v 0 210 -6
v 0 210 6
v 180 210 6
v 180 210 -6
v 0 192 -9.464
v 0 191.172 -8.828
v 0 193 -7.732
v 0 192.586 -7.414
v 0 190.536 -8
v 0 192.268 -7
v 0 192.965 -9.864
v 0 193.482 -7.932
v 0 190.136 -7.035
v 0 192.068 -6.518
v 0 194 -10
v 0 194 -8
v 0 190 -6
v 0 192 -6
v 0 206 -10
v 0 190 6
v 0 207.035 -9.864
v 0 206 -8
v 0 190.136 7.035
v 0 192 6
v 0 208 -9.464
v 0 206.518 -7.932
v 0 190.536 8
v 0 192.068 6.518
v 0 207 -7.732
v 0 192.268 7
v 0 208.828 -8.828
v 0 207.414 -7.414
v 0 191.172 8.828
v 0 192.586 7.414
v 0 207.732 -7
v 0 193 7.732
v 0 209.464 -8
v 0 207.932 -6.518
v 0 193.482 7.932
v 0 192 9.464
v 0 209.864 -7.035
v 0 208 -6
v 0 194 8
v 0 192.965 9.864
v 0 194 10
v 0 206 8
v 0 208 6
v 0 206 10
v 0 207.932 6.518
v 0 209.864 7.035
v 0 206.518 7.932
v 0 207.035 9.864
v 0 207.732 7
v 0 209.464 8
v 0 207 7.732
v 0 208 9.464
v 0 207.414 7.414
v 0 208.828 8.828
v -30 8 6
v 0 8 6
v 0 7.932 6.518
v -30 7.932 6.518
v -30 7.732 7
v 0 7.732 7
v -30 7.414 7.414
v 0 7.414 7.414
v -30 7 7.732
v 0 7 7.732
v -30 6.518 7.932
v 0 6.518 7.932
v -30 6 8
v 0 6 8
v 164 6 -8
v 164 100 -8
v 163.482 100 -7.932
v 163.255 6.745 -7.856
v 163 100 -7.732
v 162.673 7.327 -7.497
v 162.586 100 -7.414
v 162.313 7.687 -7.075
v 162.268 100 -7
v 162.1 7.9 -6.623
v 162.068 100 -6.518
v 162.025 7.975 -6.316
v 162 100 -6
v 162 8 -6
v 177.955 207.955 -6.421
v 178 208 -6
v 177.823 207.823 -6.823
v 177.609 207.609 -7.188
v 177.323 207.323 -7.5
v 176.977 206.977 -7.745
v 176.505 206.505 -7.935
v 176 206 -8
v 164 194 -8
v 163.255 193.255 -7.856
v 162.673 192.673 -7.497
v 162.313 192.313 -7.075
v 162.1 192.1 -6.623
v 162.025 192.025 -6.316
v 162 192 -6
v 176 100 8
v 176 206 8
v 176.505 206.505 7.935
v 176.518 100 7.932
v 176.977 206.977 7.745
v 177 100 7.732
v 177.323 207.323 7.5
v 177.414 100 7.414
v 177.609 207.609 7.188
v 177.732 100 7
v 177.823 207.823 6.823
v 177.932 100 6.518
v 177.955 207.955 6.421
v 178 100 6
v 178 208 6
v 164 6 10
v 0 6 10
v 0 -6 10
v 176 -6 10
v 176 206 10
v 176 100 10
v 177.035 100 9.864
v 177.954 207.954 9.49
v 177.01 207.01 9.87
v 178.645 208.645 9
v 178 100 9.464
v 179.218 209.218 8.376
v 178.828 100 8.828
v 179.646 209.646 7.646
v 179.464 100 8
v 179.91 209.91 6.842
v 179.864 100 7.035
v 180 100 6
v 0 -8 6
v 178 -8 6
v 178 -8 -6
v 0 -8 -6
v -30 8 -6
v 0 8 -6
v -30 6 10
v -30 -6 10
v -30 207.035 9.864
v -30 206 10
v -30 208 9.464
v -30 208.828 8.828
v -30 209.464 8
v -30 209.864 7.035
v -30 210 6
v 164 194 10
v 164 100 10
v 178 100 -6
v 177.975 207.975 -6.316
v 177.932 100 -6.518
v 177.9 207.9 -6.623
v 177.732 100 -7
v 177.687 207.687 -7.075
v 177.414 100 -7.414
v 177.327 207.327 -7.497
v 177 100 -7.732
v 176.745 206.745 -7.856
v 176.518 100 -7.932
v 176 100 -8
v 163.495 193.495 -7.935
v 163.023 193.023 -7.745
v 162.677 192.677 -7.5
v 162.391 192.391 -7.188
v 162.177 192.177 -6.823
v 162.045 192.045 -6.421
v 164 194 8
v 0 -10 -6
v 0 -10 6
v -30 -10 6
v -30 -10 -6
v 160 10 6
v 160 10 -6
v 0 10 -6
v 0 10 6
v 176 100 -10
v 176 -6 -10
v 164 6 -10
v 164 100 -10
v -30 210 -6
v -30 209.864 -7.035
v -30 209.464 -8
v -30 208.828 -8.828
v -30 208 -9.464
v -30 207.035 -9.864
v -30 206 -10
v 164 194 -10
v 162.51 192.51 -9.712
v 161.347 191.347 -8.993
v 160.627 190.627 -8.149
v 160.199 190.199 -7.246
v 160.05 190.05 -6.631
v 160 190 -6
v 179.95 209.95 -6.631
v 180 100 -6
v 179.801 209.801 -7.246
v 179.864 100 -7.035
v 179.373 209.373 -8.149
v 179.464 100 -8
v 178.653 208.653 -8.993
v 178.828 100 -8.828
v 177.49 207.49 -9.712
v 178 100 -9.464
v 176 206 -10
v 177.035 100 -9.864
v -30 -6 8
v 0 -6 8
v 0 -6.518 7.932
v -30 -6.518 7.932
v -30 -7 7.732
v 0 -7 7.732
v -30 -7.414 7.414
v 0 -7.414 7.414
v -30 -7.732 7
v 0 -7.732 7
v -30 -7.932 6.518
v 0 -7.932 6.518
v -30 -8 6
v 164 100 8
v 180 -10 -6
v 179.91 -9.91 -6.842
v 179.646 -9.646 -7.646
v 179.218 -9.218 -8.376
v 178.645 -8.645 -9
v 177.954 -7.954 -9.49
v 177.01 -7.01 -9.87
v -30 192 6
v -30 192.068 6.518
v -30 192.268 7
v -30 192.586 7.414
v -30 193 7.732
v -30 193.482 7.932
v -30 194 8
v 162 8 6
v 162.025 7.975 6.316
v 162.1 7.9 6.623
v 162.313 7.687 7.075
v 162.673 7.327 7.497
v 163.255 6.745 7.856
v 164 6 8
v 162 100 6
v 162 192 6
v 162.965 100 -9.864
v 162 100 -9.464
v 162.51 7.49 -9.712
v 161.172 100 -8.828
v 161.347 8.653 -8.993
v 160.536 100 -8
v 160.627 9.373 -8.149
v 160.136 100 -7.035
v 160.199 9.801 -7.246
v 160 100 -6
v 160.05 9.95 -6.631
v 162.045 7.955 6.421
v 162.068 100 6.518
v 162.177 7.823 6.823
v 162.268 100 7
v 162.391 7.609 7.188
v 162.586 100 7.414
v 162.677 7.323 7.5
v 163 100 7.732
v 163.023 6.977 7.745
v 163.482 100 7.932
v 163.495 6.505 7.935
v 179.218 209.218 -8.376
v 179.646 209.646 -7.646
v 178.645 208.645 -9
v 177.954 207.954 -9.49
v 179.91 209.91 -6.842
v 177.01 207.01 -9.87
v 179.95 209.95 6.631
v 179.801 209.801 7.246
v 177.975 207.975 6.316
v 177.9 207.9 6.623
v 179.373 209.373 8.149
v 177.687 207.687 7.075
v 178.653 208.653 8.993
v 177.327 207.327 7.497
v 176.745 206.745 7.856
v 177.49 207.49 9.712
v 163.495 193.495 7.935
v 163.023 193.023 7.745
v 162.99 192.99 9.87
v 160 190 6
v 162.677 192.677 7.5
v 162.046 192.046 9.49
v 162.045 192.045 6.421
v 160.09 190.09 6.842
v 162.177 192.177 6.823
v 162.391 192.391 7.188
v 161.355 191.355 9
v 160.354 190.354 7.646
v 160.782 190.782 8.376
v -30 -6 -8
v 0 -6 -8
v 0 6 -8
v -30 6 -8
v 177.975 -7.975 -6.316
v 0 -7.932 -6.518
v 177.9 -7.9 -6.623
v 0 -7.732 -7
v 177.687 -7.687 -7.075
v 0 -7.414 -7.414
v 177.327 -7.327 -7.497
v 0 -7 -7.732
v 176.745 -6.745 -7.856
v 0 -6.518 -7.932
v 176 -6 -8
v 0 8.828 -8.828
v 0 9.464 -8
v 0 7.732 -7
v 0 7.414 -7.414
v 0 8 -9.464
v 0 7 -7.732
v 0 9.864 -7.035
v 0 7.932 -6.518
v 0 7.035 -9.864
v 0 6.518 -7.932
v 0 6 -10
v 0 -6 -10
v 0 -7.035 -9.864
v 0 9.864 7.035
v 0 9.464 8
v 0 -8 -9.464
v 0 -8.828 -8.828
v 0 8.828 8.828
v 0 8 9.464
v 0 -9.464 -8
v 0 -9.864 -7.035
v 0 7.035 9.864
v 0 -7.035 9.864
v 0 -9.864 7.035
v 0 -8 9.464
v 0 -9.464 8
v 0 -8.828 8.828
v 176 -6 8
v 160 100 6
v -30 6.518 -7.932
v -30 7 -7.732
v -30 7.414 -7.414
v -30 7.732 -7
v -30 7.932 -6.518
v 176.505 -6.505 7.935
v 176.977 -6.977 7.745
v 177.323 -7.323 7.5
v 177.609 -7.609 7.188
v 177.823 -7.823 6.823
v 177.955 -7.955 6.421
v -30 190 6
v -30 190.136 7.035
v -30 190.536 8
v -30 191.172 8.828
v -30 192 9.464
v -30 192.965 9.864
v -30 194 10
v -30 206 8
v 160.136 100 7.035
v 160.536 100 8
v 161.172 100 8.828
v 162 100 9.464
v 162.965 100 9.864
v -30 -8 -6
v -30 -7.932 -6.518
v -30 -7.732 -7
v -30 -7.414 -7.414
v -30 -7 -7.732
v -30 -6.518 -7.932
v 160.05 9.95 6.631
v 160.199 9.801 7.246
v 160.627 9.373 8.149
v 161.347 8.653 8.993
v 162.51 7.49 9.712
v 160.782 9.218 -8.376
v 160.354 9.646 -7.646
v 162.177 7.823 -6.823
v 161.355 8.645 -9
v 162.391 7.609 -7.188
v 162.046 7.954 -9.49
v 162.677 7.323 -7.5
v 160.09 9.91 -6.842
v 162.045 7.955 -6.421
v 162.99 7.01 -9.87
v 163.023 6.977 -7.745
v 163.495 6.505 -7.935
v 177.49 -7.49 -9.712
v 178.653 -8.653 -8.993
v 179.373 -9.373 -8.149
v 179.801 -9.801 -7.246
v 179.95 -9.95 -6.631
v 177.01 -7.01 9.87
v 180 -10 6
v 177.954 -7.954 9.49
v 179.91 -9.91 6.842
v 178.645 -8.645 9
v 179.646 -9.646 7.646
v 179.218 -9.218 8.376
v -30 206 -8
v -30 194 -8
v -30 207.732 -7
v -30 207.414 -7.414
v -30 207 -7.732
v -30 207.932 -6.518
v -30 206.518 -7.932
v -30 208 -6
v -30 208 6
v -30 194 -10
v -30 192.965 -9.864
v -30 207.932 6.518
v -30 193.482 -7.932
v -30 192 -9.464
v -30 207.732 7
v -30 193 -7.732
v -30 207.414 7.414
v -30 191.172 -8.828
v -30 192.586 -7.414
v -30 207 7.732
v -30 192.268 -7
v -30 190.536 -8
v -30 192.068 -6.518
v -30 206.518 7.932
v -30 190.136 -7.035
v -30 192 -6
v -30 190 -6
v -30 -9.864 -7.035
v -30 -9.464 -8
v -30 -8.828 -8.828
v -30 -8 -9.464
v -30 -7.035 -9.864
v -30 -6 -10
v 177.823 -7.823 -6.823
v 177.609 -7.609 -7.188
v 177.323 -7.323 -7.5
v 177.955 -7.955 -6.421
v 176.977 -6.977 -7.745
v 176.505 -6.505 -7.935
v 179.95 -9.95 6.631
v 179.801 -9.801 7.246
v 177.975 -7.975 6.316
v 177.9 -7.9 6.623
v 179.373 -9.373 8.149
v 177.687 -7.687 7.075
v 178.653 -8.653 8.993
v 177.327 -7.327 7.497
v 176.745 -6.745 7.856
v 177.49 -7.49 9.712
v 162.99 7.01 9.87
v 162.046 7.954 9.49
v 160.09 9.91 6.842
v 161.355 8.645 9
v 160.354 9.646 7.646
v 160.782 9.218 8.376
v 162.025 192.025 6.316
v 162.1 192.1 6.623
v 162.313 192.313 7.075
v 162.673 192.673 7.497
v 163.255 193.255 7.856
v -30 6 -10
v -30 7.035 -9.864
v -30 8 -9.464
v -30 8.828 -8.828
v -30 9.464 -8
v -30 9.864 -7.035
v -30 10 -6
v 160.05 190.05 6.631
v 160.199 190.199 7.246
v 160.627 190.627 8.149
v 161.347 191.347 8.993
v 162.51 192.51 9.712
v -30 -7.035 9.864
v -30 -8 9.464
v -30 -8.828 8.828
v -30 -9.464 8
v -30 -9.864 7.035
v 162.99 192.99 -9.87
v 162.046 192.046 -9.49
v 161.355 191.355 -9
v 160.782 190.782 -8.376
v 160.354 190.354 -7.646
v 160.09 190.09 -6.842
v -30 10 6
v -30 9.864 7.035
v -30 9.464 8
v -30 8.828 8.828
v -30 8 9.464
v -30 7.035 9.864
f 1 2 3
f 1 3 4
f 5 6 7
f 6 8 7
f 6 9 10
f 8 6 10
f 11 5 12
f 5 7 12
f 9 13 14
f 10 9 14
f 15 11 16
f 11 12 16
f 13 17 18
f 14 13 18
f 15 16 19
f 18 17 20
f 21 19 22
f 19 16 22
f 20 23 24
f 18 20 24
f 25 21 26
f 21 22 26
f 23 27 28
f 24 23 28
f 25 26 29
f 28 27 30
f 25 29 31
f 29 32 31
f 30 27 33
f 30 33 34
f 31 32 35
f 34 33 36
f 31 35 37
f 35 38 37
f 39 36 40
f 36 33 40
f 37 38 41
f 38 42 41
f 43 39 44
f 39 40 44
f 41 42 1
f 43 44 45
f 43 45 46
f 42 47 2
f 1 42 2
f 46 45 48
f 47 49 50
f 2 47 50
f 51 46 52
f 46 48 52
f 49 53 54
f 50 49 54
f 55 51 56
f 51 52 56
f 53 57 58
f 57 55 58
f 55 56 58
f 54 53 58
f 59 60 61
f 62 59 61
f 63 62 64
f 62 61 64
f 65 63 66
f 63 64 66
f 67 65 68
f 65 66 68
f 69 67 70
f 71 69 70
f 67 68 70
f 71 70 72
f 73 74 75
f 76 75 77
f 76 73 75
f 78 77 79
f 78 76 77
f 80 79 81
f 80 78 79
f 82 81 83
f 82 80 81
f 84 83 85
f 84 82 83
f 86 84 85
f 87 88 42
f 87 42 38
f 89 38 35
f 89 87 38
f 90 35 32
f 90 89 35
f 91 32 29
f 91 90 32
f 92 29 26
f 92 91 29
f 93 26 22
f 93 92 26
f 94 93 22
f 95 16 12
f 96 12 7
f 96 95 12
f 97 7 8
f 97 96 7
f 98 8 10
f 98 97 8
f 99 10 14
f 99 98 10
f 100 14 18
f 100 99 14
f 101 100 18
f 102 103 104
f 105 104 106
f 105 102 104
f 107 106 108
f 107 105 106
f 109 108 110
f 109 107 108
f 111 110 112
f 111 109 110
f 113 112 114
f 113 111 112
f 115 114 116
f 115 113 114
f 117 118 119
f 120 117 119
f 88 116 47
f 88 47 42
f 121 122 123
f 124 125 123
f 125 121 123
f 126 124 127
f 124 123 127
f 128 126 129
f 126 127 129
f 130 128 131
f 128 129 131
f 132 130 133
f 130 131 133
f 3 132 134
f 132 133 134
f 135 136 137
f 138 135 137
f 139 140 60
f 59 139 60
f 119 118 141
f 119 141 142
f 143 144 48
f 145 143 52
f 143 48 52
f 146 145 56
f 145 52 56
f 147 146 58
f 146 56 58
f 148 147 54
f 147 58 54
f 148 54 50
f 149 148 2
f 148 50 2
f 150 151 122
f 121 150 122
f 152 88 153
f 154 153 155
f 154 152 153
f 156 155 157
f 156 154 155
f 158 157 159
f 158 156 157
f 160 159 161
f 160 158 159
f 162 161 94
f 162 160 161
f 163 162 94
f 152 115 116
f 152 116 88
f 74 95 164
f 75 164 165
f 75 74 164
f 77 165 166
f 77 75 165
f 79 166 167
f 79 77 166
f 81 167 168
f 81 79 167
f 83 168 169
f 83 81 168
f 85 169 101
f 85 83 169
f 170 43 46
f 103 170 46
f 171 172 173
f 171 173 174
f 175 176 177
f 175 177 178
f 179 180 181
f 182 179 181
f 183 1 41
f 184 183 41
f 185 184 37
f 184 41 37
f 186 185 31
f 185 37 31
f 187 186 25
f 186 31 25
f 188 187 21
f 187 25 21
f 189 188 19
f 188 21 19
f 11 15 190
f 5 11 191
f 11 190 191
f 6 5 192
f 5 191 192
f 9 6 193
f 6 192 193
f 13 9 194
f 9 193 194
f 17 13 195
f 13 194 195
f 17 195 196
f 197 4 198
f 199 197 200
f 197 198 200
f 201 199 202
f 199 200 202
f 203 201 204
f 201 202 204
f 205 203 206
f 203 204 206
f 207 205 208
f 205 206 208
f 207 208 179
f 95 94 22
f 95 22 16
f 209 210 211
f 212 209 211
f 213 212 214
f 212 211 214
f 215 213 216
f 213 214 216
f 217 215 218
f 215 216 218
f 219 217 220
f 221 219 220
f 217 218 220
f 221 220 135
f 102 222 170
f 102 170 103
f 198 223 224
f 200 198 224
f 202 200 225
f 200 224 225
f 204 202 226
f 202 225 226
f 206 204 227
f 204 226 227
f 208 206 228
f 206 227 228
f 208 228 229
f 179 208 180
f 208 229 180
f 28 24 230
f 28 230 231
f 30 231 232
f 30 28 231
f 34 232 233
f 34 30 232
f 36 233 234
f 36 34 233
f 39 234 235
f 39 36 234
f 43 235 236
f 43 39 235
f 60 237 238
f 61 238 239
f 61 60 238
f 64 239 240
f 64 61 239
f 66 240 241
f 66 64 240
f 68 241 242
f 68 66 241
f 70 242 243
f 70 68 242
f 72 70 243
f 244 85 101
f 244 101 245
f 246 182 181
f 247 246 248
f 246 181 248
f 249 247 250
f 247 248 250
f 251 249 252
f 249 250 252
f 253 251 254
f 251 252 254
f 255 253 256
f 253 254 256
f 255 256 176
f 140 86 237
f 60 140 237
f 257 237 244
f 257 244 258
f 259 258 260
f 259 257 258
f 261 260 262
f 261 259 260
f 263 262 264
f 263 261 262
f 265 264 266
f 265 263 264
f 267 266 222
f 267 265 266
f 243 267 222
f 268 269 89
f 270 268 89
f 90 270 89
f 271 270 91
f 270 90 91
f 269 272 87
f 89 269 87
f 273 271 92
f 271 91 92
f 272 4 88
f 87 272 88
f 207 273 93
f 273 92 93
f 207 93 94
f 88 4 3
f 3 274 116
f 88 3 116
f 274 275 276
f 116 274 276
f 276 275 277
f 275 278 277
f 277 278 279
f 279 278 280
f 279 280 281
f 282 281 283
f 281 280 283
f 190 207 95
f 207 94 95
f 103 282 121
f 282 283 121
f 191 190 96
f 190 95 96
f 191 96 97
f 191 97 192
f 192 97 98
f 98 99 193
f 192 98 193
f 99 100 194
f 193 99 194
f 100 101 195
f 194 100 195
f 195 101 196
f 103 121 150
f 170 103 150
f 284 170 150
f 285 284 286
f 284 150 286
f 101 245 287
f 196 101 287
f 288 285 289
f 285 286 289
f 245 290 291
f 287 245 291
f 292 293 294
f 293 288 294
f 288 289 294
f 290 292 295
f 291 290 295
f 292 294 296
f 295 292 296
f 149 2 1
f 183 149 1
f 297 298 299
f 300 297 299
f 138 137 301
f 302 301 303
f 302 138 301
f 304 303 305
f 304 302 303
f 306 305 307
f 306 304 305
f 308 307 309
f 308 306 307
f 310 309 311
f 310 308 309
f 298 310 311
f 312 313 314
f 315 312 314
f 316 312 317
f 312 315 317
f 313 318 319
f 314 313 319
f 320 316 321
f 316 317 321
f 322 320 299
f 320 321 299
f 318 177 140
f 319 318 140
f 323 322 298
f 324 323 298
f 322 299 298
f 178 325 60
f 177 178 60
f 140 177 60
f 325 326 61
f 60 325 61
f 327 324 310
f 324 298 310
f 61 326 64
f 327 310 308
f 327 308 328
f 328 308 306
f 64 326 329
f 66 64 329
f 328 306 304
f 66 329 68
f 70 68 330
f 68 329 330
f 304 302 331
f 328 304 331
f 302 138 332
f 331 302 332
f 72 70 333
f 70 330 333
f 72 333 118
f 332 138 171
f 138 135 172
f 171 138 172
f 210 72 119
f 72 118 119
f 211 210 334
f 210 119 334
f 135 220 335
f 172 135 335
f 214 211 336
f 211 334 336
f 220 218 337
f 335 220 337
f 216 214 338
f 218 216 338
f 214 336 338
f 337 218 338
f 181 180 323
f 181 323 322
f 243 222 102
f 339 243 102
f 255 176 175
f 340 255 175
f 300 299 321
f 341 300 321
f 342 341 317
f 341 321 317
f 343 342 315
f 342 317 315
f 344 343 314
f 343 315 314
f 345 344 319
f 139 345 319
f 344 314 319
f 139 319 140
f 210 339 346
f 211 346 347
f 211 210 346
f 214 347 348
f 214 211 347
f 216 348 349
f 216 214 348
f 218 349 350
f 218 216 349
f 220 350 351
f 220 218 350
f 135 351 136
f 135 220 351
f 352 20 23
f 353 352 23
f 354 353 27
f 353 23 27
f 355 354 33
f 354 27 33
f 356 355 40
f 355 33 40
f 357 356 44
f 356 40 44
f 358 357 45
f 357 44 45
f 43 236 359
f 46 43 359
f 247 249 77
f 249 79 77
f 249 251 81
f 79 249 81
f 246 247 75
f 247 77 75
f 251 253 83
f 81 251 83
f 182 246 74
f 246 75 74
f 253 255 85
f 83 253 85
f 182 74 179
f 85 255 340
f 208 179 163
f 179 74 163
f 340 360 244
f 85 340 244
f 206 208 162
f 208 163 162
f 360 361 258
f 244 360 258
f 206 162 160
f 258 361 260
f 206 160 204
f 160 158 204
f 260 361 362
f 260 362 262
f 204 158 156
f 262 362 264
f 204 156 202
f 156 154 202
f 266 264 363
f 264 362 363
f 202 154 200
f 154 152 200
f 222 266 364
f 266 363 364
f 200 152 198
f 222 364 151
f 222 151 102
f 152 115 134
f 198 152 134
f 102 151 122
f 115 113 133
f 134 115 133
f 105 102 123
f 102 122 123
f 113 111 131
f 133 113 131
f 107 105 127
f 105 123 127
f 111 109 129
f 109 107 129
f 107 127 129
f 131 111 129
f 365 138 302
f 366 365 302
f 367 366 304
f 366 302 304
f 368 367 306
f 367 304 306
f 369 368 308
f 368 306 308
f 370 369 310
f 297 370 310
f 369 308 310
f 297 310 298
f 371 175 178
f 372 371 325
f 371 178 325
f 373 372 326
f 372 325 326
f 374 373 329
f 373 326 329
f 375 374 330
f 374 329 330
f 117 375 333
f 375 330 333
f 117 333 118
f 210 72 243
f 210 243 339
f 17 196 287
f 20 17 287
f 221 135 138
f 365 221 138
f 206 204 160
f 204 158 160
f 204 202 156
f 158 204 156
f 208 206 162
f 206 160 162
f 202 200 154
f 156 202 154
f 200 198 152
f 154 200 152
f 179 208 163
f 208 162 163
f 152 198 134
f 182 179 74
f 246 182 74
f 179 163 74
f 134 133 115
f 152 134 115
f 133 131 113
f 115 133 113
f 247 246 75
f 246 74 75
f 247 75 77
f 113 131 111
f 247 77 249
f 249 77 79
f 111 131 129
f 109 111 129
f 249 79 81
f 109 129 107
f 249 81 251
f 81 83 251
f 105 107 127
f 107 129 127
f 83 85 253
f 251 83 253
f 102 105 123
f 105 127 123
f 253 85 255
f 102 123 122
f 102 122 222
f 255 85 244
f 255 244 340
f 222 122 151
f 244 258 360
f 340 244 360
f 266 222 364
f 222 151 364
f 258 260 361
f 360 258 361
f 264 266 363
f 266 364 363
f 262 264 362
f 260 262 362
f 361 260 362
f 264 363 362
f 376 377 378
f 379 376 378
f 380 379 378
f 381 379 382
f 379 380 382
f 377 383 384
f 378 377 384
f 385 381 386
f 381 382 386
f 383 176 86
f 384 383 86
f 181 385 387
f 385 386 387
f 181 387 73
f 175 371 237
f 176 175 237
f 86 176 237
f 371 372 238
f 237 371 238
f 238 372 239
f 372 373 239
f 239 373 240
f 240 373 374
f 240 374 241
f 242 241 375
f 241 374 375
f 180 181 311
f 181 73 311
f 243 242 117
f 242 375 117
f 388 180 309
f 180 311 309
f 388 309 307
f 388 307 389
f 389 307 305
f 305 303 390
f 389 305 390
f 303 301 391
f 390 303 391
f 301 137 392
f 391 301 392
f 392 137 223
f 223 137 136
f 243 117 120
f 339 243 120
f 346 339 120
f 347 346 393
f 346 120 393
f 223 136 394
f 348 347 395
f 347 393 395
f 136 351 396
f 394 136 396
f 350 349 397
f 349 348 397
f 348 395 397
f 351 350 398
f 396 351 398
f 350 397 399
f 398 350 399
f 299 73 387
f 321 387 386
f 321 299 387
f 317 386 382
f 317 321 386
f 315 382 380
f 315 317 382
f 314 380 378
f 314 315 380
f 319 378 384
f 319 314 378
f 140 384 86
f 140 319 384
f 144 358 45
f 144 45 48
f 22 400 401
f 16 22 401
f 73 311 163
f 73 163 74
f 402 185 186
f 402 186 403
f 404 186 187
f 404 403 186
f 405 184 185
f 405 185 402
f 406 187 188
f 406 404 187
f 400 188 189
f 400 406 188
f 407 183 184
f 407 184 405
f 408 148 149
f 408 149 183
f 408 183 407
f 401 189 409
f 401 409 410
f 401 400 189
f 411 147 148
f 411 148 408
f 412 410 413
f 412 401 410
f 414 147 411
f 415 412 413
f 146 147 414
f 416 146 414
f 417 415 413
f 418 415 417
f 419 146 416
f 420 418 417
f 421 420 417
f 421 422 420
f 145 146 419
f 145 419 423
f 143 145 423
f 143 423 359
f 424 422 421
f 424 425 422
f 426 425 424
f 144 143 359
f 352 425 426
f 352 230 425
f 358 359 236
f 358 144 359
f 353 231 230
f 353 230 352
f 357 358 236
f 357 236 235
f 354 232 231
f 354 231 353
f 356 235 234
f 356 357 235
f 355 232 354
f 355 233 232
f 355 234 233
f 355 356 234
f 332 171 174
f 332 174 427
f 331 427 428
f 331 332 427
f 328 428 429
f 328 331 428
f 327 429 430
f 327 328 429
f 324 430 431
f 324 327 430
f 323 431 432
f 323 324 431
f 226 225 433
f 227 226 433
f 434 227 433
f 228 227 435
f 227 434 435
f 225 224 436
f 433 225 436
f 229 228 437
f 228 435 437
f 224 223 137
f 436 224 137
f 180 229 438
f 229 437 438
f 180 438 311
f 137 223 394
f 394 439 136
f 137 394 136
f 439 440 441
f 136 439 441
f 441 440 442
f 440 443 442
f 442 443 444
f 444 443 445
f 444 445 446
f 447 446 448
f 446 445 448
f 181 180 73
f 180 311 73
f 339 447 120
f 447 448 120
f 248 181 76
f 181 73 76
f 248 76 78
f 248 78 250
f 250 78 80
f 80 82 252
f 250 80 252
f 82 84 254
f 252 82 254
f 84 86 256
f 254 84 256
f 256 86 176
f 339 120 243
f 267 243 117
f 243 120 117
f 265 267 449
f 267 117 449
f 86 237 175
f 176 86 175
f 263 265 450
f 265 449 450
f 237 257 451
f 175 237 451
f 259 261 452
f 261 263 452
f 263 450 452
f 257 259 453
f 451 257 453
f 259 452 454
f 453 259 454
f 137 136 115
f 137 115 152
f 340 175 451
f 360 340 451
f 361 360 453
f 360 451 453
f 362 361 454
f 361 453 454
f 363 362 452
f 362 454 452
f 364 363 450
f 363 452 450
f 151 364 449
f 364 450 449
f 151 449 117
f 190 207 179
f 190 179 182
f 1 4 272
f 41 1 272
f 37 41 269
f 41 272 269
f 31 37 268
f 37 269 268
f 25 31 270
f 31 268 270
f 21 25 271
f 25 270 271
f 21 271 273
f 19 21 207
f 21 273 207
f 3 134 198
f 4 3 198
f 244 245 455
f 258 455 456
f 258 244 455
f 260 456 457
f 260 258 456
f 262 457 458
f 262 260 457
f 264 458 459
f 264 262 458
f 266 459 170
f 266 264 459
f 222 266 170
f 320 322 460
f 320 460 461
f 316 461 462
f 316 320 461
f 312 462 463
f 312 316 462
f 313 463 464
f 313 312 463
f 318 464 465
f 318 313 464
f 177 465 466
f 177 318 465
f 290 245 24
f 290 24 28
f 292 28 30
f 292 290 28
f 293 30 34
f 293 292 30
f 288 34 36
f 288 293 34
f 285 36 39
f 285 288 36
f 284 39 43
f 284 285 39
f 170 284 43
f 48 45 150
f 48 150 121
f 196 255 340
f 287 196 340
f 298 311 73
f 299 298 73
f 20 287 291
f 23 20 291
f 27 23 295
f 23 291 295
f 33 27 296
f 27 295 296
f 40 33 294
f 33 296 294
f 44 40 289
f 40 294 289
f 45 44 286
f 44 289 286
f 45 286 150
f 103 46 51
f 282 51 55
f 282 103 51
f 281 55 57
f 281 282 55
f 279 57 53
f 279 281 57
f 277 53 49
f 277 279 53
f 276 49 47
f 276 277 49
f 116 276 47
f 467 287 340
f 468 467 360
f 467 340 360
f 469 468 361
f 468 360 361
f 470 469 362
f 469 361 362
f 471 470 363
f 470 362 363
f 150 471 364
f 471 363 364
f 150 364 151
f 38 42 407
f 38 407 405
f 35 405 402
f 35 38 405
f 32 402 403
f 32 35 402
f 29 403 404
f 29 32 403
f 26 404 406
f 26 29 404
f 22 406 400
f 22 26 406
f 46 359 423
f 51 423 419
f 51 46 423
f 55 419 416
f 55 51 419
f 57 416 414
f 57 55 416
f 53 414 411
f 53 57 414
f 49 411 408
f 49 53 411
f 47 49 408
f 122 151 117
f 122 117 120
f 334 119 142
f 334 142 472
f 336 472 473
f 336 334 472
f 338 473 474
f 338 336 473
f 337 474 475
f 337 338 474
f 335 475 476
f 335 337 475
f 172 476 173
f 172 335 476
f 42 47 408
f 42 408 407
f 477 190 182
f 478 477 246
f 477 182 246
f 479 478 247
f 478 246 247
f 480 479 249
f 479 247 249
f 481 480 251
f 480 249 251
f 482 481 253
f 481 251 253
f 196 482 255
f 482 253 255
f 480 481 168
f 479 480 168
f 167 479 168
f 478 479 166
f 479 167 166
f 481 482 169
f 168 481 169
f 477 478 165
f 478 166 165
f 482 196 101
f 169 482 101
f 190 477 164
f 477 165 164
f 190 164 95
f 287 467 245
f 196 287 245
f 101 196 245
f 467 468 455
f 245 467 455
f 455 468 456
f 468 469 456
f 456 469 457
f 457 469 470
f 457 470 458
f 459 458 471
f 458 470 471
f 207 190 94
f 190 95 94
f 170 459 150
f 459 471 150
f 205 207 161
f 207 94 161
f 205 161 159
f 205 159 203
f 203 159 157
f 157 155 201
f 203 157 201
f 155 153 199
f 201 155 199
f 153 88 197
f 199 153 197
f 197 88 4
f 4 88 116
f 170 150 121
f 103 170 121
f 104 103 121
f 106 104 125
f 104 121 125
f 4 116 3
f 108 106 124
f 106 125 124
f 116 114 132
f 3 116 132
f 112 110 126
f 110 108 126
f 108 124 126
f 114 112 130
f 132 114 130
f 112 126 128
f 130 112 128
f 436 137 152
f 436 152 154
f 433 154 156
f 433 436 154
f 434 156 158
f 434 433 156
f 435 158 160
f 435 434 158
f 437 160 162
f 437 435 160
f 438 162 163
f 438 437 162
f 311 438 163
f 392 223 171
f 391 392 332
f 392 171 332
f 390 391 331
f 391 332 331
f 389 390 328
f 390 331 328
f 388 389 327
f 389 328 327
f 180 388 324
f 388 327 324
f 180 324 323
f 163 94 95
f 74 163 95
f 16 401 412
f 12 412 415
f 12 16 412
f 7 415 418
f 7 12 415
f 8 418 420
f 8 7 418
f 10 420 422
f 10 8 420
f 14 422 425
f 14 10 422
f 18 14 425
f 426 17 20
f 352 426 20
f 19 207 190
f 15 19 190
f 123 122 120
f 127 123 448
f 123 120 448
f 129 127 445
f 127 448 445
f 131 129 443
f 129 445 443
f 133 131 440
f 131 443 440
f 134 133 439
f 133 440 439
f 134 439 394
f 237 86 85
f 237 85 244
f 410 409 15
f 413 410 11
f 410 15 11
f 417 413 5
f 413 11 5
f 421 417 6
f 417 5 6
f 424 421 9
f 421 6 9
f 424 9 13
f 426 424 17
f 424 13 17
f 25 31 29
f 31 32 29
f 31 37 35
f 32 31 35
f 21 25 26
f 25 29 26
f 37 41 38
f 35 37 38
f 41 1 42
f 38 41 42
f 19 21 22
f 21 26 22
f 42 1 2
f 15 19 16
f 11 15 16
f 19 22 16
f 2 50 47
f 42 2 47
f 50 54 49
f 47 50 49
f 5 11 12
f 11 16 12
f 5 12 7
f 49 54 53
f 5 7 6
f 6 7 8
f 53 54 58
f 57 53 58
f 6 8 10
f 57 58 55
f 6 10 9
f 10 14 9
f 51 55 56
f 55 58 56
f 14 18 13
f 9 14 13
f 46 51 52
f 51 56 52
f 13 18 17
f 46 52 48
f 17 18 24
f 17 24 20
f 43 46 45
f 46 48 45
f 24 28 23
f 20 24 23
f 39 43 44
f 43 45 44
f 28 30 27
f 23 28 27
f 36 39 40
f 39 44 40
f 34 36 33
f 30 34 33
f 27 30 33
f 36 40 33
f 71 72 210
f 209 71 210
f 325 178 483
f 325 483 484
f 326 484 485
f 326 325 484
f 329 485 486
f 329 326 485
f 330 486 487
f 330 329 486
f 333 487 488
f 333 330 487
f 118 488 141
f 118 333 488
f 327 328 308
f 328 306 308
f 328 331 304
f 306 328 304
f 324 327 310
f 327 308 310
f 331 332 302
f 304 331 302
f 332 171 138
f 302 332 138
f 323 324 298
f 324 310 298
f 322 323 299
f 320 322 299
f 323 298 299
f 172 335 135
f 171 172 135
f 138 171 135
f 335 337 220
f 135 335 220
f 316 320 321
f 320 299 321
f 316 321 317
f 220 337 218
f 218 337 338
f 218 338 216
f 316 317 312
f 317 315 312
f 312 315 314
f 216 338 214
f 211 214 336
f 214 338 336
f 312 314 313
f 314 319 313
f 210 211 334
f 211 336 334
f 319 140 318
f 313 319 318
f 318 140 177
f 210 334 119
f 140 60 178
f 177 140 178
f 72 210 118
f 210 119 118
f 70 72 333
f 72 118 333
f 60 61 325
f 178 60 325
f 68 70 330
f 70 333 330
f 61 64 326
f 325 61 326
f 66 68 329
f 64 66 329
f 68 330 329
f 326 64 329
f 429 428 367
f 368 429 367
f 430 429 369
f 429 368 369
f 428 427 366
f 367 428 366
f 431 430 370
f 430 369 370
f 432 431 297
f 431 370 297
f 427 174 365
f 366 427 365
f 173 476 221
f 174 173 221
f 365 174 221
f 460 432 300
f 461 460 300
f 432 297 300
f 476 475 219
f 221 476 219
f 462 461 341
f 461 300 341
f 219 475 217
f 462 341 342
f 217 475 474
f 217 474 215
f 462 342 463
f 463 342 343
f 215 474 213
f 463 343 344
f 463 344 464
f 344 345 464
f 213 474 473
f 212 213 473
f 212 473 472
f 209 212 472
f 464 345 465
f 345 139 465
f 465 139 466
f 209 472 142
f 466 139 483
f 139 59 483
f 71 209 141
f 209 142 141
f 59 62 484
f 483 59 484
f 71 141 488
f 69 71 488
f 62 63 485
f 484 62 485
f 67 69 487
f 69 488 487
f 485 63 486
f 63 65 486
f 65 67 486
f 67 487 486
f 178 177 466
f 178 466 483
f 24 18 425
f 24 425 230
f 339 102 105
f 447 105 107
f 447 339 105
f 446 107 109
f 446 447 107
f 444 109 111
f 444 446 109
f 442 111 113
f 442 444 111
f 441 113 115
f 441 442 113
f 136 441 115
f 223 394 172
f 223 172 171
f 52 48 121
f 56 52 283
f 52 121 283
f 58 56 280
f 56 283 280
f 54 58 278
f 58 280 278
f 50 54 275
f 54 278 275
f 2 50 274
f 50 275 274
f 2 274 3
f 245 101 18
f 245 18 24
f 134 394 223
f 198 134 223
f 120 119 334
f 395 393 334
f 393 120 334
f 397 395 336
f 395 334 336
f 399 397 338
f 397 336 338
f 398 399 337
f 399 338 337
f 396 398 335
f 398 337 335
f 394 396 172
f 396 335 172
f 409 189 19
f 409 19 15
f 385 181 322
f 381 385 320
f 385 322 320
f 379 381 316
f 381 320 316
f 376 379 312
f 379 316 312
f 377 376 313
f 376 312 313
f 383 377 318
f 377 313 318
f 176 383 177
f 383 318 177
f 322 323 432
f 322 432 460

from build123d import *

# Parameters (mm, degrees)
SQUARE_TUBE_20_X_20_X_2_1_DEPTH      = 1
SQUARE_TUBE_20_X_20_X_2_1_DEPTH_BACK = 30
SQUARE_TUBE_20_X_20_X_2_1_2_DEPTH    = 186.142135624
SQUARE_TUBE_20_X_20_X_2_1_3_DEPTH    = 116.142135624
SQUARE_TUBE_20_X_20_X_2_1_4_DEPTH    = 116.142135624
SQUARE_TUBE_20_X_20_X_2_1_5_DEPTH    = 186.142135624
SQUARE_TUBE_20_X_20_X_2_1_6_DEPTH    = 31


with BuildPart() as part:
    # Sketch11 → Square tube 20 X 20 X 2(1) (new, two sides)
    with BuildSketch(Plane.YZ) as square_tube_20_x_20_x_2_1_sk:
        with BuildLine():
            Line((-6, -10), (6, -10))
            ThreePointArc((6, -10), (8.828427125, -8.828427125), (10, -6))
            Line((10, -6), (10, 6))
            ThreePointArc((10, 6), (8.828427125, 8.828427125), (6, 10))
            Line((6, 10), (-6, 10))
            ThreePointArc((-6, 10), (-8.828427125, 8.828427125), (-10, 6))
            Line((-10, 6), (-10, -6))
            ThreePointArc((-10, -6), (-8.828427125, -8.828427125), (-6, -10))
        make_face()
        with BuildLine():
            Line((-6, -8), (6, -8))
            ThreePointArc((6, -8), (7.414213562, -7.414213562), (8, -6))
            Line((8, -6), (8, 6))
            ThreePointArc((8, 6), (7.414213562, 7.414213562), (6, 8))
            Line((6, 8), (-6, 8))
            ThreePointArc((-6, 8), (-7.414213562, 7.414213562), (-8, 6))
            Line((-8, 6), (-8, -6))
            ThreePointArc((-8, -6), (-7.414213562, -7.414213562), (-6, -8))
        make_face(mode=Mode.SUBTRACT)
    extrude(amount=SQUARE_TUBE_20_X_20_X_2_1_DEPTH)
    extrude(square_tube_20_x_20_x_2_1_sk.sketch, amount=-SQUARE_TUBE_20_X_20_X_2_1_DEPTH_BACK)

    # Square tube 20 X 20 X 2(1) mitre 1
    split(bisect_by=Plane(origin=(0, 0, 0), x_dir=(0, -1, 0), z_dir=(-1, 0, 0)), keep=Keep.TOP)


with BuildPart() as body_2:
    # Sketch11 on segment 2 (carried to segment 2) → Square tube 20 X 20 X 2_1 2 (new body)
    with BuildSketch(Plane.YZ.offset(-1)):
        with BuildLine():
            Line((-6, -10), (6, -10))
            ThreePointArc((6, -10), (8.828427125, -8.828427125), (10, -6))
            Line((10, -6), (10, 6))
            ThreePointArc((10, 6), (8.828427125, 8.828427125), (6, 10))
            Line((6, 10), (-6, 10))
            ThreePointArc((-6, 10), (-8.828427125, 8.828427125), (-10, 6))
            Line((-10, 6), (-10, -6))
            ThreePointArc((-10, -6), (-8.828427125, -8.828427125), (-6, -10))
        make_face()
        with BuildLine():
            Line((-6, -8), (6, -8))
            ThreePointArc((6, -8), (7.414213562, -7.414213562), (8, -6))
            Line((8, -6), (8, 6))
            ThreePointArc((8, 6), (7.414213562, 7.414213562), (6, 8))
            Line((6, 8), (-6, 8))
            ThreePointArc((-6, 8), (-7.414213562, 7.414213562), (-8, 6))
            Line((-8, 6), (-8, -6))
            ThreePointArc((-8, -6), (-7.414213562, -7.414213562), (-6, -8))
        make_face(mode=Mode.SUBTRACT)
    extrude(amount=SQUARE_TUBE_20_X_20_X_2_1_2_DEPTH)

    # Square tube 20 X 20 X 2_1 2 mitre 1
    split(bisect_by=Plane.YZ, keep=Keep.TOP)

    # Square tube 20 X 20 X 2_1 2 mitre 2
    split(bisect_by=Plane(origin=(170, 0, 0), x_dir=(0.707106781, -0.707106781, 0), z_dir=(-0.707106781, -0.707106781, 0)), keep=Keep.TOP)


with BuildPart() as body_3:
    # Sketch11 on segment 3 (carried to segment 3) → Square tube 20 X 20 X 2_1 3 (new body)
    with BuildSketch(Plane(origin=(170, -15.142135624, 0), x_dir=(-1, 0, 0), z_dir=(0, 1, 0))):
        with BuildLine():
            Line((-6, -10), (6, -10))
            ThreePointArc((6, -10), (8.828427125, -8.828427125), (10, -6))
            Line((10, -6), (10, 6))
            ThreePointArc((10, 6), (8.828427125, 8.828427125), (6, 10))
            Line((6, 10), (-6, 10))
            ThreePointArc((-6, 10), (-8.828427125, 8.828427125), (-10, 6))
            Line((-10, 6), (-10, -6))
            ThreePointArc((-10, -6), (-8.828427125, -8.828427125), (-6, -10))
        make_face()
        with BuildLine():
            Line((-6, -8), (6, -8))
            ThreePointArc((6, -8), (7.414213562, -7.414213562), (8, -6))
            Line((8, -6), (8, 6))
            ThreePointArc((8, 6), (7.414213562, 7.414213562), (6, 8))
            Line((6, 8), (-6, 8))
            ThreePointArc((-6, 8), (-7.414213562, 7.414213562), (-8, 6))
            Line((-8, 6), (-8, -6))
            ThreePointArc((-8, -6), (-7.414213562, -7.414213562), (-6, -8))
        make_face(mode=Mode.SUBTRACT)
    extrude(amount=SQUARE_TUBE_20_X_20_X_2_1_3_DEPTH)

    # Square tube 20 X 20 X 2_1 3 mitre 1
    split(bisect_by=Plane(origin=(170, 100, 0), x_dir=(1, 0, 0), z_dir=(0, -1, 0)), keep=Keep.TOP)

    # Square tube 20 X 20 X 2_1 3 mitre 2
    split(bisect_by=Plane(origin=(170, 0, 0), x_dir=(-0.707106781, 0.707106781, 0), z_dir=(0.707106781, 0.707106781, 0)), keep=Keep.TOP)


with BuildPart() as body_4:
    # Sketch11 on segment 4 (carried to segment 4) → Square tube 20 X 20 X 2_1 4 (new body)
    with BuildSketch(Plane(origin=(170, 99, 0), x_dir=(-1, 0, 0), z_dir=(0, 1, 0))):
        with BuildLine():
            Line((-6, -10), (6, -10))
            ThreePointArc((6, -10), (8.828427125, -8.828427125), (10, -6))
            Line((10, -6), (10, 6))
            ThreePointArc((10, 6), (8.828427125, 8.828427125), (6, 10))
            Line((6, 10), (-6, 10))
            ThreePointArc((-6, 10), (-8.828427125, 8.828427125), (-10, 6))
            Line((-10, 6), (-10, -6))
            ThreePointArc((-10, -6), (-8.828427125, -8.828427125), (-6, -10))
        make_face()
        with BuildLine():
            Line((-6, -8), (6, -8))
            ThreePointArc((6, -8), (7.414213562, -7.414213562), (8, -6))
            Line((8, -6), (8, 6))
            ThreePointArc((8, 6), (7.414213562, 7.414213562), (6, 8))
            Line((6, 8), (-6, 8))
            ThreePointArc((-6, 8), (-7.414213562, 7.414213562), (-8, 6))
            Line((-8, 6), (-8, -6))
            ThreePointArc((-8, -6), (-7.414213562, -7.414213562), (-6, -8))
        make_face(mode=Mode.SUBTRACT)
    extrude(amount=SQUARE_TUBE_20_X_20_X_2_1_4_DEPTH)

    # Square tube 20 X 20 X 2_1 4 mitre 1
    split(bisect_by=Plane(origin=(170, 200, 0), x_dir=(0.707106781, 0.707106781, 0), z_dir=(0.707106781, -0.707106781, 0)), keep=Keep.TOP)

    # Square tube 20 X 20 X 2_1 4 mitre 2
    split(bisect_by=Plane(origin=(170, 100, 0), x_dir=(-1, 0, 0), z_dir=(0, 1, 0)), keep=Keep.TOP)


with BuildPart() as body_5:
    # Sketch11 on segment 5 (carried to segment 5) → Square tube 20 X 20 X 2_1 5 (new body)
    with BuildSketch(Plane(origin=(185.142135624, 200, 0), x_dir=(0, -1, 0), z_dir=(-1, 0, 0))):
        with BuildLine():
            Line((-6, -10), (6, -10))
            ThreePointArc((6, -10), (8.828427125, -8.828427125), (10, -6))
            Line((10, -6), (10, 6))
            ThreePointArc((10, 6), (8.828427125, 8.828427125), (6, 10))
            Line((6, 10), (-6, 10))
            ThreePointArc((-6, 10), (-8.828427125, 8.828427125), (-10, 6))
            Line((-10, 6), (-10, -6))
            ThreePointArc((-10, -6), (-8.828427125, -8.828427125), (-6, -10))
        make_face()
        with BuildLine():
            Line((-6, -8), (6, -8))
            ThreePointArc((6, -8), (7.414213562, -7.414213562), (8, -6))
            Line((8, -6), (8, 6))
            ThreePointArc((8, 6), (7.414213562, 7.414213562), (6, 8))
            Line((6, 8), (-6, 8))
            ThreePointArc((-6, 8), (-7.414213562, 7.414213562), (-8, 6))
            Line((-8, 6), (-8, -6))
            ThreePointArc((-8, -6), (-7.414213562, -7.414213562), (-6, -8))
        make_face(mode=Mode.SUBTRACT)
    extrude(amount=SQUARE_TUBE_20_X_20_X_2_1_5_DEPTH)

    # Square tube 20 X 20 X 2_1 5 mitre 1
    split(bisect_by=Plane(origin=(0, 200, 0), x_dir=(0, 1, 0), z_dir=(1, 0, 0)), keep=Keep.TOP)

    # Square tube 20 X 20 X 2_1 5 mitre 2
    split(bisect_by=Plane(origin=(170, 200, 0), x_dir=(-0.707106781, -0.707106781, 0), z_dir=(-0.707106781, 0.707106781, 0)), keep=Keep.TOP)


with BuildPart() as body_6:
    # Sketch11 on segment 6 (carried to segment 6) → Square tube 20 X 20 X 2_1 6 (new body)
    with BuildSketch(Plane(origin=(1, 200, 0), x_dir=(0, -1, 0), z_dir=(-1, 0, 0))):
        with BuildLine():
            Line((-6, -10), (6, -10))
            ThreePointArc((6, -10), (8.828427125, -8.828427125), (10, -6))
            Line((10, -6), (10, 6))
            ThreePointArc((10, 6), (8.828427125, 8.828427125), (6, 10))
            Line((6, 10), (-6, 10))
            ThreePointArc((-6, 10), (-8.828427125, 8.828427125), (-10, 6))
            Line((-10, 6), (-10, -6))
            ThreePointArc((-10, -6), (-8.828427125, -8.828427125), (-6, -10))
        make_face()
        with BuildLine():
            Line((-6, -8), (6, -8))
            ThreePointArc((6, -8), (7.414213562, -7.414213562), (8, -6))
            Line((8, -6), (8, 6))
            ThreePointArc((8, 6), (7.414213562, 7.414213562), (6, 8))
            Line((6, 8), (-6, 8))
            ThreePointArc((-6, 8), (-7.414213562, 7.414213562), (-8, 6))
            Line((-8, 6), (-8, -6))
            ThreePointArc((-8, -6), (-7.414213562, -7.414213562), (-6, -8))
        make_face(mode=Mode.SUBTRACT)
    extrude(amount=SQUARE_TUBE_20_X_20_X_2_1_6_DEPTH)

    # Square tube 20 X 20 X 2_1 6 mitre 1
    split(bisect_by=Plane(origin=(0, 200, 0), x_dir=(0, -1, 0), z_dir=(-1, 0, 0)), keep=Keep.TOP)


solid = Compound([part.part, body_2.part, body_3.part, body_4.part, body_5.part, body_6.part])
